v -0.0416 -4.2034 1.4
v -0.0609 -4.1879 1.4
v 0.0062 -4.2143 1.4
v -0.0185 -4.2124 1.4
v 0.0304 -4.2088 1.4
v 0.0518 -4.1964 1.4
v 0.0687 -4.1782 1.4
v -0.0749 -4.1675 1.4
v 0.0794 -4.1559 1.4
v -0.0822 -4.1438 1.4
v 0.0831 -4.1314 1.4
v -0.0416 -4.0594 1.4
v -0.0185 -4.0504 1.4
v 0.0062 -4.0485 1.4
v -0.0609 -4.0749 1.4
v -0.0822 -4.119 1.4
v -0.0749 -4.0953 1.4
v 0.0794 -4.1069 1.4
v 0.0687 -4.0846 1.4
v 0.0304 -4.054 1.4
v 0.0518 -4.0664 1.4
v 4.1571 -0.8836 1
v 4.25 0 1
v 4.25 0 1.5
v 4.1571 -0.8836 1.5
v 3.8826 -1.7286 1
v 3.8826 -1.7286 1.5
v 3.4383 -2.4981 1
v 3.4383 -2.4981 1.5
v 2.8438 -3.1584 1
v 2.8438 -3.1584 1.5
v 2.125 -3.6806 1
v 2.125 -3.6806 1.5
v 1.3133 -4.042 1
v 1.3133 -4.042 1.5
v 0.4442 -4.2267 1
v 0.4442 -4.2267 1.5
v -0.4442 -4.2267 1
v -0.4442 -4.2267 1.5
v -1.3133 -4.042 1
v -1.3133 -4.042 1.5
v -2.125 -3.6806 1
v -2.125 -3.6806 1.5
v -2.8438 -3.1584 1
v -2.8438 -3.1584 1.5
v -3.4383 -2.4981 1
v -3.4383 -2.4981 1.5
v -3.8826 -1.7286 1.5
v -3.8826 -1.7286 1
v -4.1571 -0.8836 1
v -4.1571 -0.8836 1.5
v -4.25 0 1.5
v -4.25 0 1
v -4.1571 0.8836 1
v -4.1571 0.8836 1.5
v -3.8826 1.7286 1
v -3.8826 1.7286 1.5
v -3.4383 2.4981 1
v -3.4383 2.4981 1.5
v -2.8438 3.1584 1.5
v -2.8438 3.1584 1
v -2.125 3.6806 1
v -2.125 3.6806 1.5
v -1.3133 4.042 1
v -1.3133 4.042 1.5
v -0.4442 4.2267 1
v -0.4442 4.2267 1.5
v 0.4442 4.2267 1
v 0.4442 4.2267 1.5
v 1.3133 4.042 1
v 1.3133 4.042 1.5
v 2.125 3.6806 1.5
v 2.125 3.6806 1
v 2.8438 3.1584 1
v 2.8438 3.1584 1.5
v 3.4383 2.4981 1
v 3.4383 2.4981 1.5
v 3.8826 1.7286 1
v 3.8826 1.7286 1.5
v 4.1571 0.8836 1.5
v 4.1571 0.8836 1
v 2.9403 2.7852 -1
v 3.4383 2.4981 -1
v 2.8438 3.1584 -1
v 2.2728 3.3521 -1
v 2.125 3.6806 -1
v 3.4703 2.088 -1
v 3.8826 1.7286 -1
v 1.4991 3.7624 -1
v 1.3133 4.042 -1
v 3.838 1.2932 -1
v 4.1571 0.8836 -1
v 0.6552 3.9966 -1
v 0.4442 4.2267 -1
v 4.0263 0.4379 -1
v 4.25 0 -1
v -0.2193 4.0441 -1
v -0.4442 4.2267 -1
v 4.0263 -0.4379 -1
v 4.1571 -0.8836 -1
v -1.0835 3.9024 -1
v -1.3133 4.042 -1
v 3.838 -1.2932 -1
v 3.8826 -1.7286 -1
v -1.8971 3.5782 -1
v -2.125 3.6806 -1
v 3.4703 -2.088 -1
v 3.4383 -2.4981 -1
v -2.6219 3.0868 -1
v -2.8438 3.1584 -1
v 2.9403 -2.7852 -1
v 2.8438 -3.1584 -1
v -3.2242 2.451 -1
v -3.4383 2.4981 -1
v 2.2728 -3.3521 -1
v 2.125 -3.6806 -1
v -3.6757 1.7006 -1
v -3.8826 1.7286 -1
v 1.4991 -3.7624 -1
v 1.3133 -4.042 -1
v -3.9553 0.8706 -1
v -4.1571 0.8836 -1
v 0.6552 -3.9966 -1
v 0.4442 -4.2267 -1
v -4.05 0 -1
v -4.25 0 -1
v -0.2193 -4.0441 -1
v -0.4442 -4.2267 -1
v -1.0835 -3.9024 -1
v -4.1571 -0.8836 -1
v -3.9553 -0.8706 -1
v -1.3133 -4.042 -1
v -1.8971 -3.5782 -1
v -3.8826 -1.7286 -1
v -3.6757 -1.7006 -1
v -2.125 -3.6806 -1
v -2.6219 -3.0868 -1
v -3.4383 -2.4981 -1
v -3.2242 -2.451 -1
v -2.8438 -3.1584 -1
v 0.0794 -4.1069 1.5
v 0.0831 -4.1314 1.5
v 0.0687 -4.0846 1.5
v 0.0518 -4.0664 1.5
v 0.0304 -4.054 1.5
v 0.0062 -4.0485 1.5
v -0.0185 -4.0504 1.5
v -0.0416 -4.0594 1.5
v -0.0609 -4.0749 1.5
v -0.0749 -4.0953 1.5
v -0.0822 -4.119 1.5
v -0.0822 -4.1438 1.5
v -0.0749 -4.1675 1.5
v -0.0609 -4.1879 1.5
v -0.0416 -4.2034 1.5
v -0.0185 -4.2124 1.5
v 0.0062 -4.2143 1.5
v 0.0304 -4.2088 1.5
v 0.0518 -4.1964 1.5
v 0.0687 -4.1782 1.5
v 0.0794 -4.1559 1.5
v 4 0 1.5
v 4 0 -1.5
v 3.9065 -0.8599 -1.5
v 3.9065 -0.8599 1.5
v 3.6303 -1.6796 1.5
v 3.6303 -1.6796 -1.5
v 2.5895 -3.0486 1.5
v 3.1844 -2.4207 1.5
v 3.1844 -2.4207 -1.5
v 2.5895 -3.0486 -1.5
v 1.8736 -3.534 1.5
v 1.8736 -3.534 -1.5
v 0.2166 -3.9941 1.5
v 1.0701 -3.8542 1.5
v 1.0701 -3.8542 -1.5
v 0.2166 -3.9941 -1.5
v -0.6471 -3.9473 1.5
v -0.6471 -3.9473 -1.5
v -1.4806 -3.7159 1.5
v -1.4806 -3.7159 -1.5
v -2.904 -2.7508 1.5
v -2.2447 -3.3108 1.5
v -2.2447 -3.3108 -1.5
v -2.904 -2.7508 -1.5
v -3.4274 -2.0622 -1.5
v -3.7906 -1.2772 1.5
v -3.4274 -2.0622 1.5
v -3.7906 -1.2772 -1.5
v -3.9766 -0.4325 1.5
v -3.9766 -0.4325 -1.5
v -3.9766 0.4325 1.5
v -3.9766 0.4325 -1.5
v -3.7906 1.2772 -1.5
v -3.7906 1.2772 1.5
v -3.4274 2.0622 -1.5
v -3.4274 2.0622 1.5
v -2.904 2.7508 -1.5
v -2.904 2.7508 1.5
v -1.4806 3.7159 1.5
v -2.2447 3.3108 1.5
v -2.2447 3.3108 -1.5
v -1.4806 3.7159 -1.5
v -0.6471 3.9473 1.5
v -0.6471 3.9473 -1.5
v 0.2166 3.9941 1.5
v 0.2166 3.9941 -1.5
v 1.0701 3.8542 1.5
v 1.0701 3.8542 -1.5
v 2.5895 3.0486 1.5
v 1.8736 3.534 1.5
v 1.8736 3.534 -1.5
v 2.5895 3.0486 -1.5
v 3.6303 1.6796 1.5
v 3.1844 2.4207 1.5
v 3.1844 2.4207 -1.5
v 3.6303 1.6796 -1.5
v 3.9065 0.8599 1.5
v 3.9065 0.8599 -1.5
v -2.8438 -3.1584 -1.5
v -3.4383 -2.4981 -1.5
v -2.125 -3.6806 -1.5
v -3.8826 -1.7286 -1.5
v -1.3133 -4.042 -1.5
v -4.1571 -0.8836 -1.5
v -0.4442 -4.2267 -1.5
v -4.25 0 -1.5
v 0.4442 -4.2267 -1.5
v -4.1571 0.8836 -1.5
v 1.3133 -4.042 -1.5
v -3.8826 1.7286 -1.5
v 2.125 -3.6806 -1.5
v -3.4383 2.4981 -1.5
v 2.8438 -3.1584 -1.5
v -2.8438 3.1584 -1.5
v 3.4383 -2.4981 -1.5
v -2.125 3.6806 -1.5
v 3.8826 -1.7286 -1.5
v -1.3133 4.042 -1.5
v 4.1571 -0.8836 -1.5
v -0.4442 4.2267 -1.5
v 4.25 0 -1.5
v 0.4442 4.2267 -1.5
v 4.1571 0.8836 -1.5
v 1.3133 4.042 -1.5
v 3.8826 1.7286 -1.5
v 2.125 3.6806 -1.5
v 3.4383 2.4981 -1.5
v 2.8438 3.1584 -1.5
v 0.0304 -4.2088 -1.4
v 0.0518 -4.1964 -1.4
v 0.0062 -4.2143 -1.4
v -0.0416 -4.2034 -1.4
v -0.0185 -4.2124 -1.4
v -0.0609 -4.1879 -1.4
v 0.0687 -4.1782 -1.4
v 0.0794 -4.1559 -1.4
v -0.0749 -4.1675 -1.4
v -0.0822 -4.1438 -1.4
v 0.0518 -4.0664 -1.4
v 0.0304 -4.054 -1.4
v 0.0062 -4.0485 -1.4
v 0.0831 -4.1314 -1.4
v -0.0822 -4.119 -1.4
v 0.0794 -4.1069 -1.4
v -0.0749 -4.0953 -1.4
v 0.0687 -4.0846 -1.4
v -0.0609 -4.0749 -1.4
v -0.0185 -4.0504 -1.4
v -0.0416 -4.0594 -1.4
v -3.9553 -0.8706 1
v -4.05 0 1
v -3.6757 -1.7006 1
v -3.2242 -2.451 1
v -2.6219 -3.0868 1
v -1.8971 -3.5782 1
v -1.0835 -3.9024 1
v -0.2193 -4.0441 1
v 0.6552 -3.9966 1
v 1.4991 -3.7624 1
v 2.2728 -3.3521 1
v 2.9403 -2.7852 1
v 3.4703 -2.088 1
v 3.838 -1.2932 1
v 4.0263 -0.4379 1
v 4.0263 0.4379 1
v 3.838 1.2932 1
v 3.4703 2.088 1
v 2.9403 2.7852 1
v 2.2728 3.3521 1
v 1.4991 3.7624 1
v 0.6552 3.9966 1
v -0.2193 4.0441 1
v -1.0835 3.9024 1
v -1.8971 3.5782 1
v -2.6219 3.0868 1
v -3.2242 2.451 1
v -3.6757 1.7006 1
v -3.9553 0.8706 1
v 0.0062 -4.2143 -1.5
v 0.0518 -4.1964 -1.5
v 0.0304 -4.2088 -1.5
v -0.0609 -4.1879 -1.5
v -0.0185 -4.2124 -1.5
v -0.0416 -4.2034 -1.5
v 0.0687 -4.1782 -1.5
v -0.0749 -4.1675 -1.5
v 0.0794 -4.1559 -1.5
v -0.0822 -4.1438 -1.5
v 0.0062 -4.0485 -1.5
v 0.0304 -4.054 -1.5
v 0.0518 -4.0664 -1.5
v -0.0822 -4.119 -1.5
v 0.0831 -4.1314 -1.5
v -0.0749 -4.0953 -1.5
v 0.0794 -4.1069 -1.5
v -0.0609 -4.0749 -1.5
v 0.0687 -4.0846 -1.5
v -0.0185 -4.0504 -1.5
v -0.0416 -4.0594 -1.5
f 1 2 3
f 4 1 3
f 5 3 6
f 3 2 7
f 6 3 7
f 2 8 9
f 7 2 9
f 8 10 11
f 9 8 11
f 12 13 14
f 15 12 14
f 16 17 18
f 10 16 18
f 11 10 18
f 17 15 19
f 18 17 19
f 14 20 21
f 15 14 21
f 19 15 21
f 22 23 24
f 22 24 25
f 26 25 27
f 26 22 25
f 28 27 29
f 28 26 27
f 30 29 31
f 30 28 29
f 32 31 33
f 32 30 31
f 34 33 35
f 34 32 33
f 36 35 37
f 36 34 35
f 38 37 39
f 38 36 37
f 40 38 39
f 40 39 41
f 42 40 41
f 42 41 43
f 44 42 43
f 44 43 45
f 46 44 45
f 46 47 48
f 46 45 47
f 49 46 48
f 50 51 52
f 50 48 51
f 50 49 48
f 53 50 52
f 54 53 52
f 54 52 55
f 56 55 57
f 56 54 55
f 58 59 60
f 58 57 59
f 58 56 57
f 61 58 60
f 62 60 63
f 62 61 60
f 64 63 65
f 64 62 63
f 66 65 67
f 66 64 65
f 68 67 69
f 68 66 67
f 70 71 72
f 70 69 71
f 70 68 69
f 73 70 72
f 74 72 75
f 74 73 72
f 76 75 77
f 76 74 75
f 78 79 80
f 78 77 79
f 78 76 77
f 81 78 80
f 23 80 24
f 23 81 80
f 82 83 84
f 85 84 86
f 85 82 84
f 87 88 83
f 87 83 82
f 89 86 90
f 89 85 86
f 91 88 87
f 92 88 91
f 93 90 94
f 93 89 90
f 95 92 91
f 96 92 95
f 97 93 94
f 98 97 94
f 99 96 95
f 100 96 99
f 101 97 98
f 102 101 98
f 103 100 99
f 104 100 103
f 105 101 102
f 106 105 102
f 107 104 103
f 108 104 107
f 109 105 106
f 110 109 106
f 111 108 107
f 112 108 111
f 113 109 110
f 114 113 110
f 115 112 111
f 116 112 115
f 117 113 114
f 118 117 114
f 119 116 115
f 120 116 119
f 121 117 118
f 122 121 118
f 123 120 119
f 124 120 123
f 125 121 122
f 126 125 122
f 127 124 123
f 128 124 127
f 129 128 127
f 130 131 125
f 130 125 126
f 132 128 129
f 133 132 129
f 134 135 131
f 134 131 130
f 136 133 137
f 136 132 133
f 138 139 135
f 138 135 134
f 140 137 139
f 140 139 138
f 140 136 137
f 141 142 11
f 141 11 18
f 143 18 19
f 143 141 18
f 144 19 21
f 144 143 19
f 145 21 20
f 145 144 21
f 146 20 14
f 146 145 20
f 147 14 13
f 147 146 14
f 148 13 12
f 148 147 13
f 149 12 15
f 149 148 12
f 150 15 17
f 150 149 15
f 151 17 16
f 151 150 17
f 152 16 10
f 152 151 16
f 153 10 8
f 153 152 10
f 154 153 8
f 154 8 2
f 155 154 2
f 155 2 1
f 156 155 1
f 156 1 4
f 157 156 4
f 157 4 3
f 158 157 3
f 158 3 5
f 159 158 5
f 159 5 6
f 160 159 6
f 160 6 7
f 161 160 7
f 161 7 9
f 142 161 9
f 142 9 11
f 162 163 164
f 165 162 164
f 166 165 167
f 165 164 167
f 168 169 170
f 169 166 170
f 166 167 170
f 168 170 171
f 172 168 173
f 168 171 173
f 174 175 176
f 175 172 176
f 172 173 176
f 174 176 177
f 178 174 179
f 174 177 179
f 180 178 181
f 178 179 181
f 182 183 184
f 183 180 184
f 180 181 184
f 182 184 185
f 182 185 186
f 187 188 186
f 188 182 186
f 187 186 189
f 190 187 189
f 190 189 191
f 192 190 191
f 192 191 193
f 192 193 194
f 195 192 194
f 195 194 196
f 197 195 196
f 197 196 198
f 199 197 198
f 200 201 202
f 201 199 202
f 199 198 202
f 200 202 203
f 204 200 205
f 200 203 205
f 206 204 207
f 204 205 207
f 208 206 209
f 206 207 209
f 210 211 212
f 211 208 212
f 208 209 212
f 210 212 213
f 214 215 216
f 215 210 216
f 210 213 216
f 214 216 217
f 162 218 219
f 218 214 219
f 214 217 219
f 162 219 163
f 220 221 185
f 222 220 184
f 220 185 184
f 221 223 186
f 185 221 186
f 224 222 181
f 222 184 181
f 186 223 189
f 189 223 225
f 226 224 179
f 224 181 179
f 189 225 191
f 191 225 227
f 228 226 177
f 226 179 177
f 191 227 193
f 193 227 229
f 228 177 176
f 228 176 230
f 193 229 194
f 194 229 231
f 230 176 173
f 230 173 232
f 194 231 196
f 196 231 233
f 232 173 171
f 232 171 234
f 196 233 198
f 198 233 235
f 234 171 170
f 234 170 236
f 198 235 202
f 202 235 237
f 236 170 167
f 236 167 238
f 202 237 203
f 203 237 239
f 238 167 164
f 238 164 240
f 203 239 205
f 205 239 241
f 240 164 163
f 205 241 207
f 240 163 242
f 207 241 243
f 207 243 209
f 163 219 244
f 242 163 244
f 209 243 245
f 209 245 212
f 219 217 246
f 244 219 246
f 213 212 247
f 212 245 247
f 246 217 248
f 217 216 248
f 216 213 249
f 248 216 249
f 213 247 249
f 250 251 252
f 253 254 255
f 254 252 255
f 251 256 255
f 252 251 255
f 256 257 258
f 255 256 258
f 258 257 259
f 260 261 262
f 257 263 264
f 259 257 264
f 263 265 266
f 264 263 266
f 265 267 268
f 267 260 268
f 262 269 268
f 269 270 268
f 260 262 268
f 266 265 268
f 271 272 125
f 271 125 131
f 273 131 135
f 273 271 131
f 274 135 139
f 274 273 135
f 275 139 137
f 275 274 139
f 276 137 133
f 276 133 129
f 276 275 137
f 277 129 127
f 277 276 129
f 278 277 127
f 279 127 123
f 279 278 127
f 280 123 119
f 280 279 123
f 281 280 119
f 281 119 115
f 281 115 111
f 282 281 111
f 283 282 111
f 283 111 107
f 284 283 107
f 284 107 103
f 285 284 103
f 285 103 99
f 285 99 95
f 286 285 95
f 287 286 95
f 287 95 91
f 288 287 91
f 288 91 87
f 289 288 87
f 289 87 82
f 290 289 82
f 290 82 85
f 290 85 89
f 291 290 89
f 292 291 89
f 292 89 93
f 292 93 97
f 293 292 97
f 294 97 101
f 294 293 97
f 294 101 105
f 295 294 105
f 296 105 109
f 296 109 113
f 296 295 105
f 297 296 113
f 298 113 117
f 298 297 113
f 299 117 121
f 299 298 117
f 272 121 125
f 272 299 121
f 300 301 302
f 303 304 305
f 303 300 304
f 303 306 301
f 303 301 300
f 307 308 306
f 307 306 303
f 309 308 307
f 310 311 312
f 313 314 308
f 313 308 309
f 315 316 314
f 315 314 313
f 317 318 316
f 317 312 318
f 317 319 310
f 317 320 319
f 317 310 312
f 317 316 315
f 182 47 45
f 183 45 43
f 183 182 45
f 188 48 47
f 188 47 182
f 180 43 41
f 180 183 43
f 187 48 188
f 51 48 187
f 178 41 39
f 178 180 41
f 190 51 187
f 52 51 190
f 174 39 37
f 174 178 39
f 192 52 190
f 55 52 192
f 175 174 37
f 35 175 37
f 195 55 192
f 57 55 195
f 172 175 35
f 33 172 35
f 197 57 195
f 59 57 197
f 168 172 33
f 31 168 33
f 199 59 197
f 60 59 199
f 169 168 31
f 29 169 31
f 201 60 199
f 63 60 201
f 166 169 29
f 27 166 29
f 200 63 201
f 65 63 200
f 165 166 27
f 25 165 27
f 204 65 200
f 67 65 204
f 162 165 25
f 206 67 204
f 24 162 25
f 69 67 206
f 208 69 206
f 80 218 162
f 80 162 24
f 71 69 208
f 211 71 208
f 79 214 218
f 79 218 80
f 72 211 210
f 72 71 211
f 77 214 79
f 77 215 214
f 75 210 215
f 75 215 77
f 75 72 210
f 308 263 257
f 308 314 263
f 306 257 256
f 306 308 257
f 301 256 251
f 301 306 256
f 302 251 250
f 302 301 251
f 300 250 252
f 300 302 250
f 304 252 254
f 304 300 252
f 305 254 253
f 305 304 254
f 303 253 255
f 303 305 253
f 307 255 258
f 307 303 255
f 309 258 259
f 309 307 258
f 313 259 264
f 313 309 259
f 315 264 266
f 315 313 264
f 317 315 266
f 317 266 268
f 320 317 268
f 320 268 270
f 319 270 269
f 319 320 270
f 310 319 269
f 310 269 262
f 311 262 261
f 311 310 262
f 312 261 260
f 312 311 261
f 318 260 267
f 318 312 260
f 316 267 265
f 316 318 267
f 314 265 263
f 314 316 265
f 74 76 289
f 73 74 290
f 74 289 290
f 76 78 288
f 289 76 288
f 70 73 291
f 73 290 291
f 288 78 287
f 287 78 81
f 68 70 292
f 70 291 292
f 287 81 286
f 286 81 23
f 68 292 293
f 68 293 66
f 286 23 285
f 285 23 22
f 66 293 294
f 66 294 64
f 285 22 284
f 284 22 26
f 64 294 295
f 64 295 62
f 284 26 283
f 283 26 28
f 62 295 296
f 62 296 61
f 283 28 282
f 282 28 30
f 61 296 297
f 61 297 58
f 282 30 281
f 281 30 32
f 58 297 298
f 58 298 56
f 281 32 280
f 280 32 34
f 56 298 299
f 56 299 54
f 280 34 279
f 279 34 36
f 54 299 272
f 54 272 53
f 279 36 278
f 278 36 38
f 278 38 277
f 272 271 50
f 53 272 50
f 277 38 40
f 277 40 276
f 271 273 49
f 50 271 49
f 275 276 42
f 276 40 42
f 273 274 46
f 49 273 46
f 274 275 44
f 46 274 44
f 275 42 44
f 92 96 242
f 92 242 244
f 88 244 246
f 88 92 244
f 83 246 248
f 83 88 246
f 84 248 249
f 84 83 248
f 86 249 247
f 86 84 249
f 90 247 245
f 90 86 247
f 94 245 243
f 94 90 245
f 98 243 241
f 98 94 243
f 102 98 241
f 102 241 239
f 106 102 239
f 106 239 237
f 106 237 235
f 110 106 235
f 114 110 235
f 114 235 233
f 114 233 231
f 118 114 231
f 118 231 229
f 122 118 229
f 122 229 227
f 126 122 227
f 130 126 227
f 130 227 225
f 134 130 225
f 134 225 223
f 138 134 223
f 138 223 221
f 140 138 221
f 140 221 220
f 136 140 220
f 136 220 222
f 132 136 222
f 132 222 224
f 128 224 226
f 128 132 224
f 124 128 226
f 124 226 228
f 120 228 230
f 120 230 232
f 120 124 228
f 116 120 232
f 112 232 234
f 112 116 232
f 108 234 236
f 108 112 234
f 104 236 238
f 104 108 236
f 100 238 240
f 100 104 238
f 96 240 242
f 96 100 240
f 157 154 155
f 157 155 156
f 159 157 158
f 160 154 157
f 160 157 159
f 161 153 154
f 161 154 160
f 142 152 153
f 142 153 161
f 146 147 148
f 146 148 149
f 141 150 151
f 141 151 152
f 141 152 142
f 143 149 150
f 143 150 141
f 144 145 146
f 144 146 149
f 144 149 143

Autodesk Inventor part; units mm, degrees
ref_plane "YZ Plane" through (0, 0, 0) normal (1, 0, 0) x (0, 1, 0)
ref_plane "XZ Plane" through (0, 0, 0) normal (0, 1, 0) x (-1, 0, 0)
ref_plane "XY Plane" through (0, 0, 0) normal (0, 0, 1) x (1, 0, 0)
sketch "Sketch1" plane through (0, 0, 0) normal (0, 0, 1) x (1, 0, 0)
  circle A0 centre (0, 0) radius 4
  circle A1 centre (0, 0) radius 4.25
  dimension "d0" = 8
  dimension "d1" = 8.5
extrude "Extrusion1" add sketch "Sketch1" along normal mid plane 3
sketch "Sketch5" plane through (0, 0, 0) normal (0, 1, 0) x (-1, 0, 0)
  line L0 (0, -2.1235) -> (0, 2.5622)
  line L1 (4.25, -1.5) -> (4.25, 1.5) projected
  line L2 (4.25, -1) -> (4.05, -1)
  line L3 (4.05, -1) -> (4.05, 1)
  line L4 (4.05, 1) -> (4.25, 1)
  line L5 (-4.25, -1.5) -> (4.25, -1.5) projected
  point P0 (0, 0)
  dimension "d12" = 0.2
  dimension "d13" = 2
  dimension "d14" = 0.5
revolve "Revolution1" cut sketch "Sketch5" angle 360 about axis through (0, 0, -2.1235) along (0, 0, 1)
sketch "Sketch6" plane through (0, 0, 1.5) normal (0, 0, 1) x (1, 0, 0)
  circle A0 centre (0, -4.1314) radius 0.0831
  point P0 (0, 0)
extrude "Extrusion2" add sketch "Sketch6" against normal blind 0.1 separate body
mirror "Mirror1" about plane through (0, 0, 0) normal (0, 0, 1) of "Extrusion2" bodies 2
properties part number "In1"
